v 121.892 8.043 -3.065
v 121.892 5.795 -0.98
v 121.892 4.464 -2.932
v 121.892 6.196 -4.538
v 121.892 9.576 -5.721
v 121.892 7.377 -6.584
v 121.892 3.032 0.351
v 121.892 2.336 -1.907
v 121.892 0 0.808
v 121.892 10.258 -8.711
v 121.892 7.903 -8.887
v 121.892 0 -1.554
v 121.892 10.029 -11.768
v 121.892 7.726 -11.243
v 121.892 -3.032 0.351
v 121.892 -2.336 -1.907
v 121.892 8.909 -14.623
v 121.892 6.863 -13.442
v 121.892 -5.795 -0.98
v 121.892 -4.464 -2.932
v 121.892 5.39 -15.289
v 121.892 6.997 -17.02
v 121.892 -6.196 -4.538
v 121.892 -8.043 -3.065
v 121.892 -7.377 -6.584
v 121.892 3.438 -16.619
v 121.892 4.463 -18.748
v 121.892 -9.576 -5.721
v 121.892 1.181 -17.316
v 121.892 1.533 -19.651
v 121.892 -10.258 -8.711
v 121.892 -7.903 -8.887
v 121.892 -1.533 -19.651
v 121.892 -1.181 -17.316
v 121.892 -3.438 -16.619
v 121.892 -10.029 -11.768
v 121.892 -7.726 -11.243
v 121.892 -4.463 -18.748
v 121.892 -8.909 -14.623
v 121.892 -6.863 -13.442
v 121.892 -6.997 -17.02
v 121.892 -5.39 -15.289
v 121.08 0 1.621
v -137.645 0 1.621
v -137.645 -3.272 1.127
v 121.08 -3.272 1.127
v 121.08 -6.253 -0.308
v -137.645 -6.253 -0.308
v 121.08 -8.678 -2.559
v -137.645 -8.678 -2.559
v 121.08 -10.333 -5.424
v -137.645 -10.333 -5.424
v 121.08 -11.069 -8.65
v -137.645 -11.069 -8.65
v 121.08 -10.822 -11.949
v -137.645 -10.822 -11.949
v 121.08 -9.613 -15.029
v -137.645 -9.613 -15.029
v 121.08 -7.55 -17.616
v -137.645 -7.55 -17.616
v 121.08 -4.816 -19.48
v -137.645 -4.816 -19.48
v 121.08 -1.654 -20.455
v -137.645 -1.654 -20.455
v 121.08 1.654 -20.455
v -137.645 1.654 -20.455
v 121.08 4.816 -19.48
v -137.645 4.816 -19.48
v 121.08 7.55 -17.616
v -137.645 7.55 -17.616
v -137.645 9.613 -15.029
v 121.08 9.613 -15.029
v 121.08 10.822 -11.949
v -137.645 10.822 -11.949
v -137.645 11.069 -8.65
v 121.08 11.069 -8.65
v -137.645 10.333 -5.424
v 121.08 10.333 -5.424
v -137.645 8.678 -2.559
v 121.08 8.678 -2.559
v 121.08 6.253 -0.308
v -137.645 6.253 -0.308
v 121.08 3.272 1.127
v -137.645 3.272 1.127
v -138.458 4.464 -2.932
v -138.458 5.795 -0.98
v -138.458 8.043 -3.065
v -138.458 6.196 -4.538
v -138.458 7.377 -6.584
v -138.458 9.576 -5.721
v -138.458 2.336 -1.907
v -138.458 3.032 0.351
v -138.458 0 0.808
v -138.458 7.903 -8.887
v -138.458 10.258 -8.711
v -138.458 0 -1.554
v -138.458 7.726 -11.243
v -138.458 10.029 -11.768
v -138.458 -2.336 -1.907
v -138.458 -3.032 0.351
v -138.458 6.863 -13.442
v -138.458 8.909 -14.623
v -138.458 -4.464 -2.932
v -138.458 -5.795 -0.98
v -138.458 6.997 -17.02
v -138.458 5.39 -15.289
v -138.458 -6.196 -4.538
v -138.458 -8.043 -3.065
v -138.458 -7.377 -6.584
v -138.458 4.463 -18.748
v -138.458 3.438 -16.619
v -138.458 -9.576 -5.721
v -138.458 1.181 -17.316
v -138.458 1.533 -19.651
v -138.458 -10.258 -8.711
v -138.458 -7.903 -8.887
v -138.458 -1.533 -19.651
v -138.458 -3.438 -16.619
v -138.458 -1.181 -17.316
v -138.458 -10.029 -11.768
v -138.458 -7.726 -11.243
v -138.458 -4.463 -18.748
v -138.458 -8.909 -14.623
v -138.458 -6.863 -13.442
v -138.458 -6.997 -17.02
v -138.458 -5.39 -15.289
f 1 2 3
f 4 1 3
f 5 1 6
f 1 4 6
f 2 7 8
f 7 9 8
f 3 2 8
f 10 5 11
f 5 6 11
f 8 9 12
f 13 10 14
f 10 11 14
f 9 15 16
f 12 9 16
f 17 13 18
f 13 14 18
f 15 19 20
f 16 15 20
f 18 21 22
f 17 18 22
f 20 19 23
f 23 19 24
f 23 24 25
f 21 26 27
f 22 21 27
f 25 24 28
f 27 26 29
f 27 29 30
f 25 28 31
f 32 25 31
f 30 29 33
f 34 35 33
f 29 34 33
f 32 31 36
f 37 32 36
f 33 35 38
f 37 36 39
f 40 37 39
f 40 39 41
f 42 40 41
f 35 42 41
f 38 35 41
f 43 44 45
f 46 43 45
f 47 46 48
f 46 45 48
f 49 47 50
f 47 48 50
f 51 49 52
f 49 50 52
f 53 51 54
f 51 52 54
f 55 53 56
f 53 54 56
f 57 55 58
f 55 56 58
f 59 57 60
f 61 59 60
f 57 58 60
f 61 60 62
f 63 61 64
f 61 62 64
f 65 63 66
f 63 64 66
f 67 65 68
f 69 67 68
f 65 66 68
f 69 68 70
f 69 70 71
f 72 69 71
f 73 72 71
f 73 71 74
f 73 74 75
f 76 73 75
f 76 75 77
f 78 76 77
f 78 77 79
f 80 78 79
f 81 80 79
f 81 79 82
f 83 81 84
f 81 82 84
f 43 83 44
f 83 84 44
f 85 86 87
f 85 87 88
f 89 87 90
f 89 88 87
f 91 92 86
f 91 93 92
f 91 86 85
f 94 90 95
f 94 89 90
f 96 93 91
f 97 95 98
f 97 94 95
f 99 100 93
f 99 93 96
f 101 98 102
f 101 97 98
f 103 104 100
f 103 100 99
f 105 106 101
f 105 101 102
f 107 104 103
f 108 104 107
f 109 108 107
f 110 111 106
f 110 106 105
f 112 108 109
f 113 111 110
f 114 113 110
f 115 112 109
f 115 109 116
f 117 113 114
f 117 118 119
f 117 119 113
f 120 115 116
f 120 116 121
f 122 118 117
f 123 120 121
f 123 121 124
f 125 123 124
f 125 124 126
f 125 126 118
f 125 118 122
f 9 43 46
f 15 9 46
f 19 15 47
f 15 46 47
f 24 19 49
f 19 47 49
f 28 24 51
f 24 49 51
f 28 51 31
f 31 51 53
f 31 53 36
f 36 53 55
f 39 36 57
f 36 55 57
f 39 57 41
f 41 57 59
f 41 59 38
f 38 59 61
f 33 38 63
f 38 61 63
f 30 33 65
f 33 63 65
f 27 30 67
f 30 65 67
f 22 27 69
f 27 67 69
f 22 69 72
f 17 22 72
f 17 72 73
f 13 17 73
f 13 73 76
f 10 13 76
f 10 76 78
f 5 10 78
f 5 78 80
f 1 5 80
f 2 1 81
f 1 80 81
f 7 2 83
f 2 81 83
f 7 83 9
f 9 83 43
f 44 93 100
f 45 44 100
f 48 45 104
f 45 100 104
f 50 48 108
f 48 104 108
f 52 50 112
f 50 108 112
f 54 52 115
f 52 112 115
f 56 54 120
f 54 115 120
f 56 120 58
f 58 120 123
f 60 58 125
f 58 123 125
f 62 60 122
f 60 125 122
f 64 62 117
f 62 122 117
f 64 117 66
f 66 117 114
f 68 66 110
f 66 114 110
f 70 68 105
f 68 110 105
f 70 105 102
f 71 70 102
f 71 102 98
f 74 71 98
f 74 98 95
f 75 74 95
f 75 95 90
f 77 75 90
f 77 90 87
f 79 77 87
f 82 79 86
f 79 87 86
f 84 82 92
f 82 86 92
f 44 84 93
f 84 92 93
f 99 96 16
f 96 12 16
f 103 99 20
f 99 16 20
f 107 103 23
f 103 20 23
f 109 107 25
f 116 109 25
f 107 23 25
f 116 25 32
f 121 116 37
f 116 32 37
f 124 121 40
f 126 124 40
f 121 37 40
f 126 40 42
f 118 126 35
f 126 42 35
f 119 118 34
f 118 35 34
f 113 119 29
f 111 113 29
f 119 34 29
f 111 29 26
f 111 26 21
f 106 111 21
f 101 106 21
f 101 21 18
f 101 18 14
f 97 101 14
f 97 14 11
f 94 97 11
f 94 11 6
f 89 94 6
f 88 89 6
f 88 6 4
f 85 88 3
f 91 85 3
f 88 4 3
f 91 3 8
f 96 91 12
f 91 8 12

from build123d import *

# Parameters (mm, degrees)
F0_W    = 133.35
F0_H    = 3.175
F0_W_2  = 12.7
F0_W_3  = 114.3
F2_SIZE = 0.8128
F3_SIZE = 0.8128


with BuildPart() as f1:
    # F0 (on Front) → F1 (revolve)
    with BuildSketch(Plane.XZ):
        with Locations((-71.7826074213, 0.0330159035)):
            Rectangle(F0_W, F0_H)
        with Locations((115.5423925787, 0.0330159035)):
            Rectangle(F0_W_2, F0_H)
        with Locations((52.0423925787, 0.0330159035)):
            Rectangle(F0_W_3, F0_H)
    revolve(axis=Axis((-8.2826074213, 0, -9.4792840965), (1, 0, 0)))

    # F2
    f2_edges = [f1.edges().sort_by_distance(p)[0] for p in [
        (121.892393, 0, -20.579084),
    ]]
    chamfer(f2_edges, length=F2_SIZE)

    # F3
    f3_edges = [f1.edges().sort_by_distance(p)[0] for p in [
        (-138.457607, 0, -20.579084),
    ]]
    chamfer(f3_edges, length=F3_SIZE)


solid = f1.part
